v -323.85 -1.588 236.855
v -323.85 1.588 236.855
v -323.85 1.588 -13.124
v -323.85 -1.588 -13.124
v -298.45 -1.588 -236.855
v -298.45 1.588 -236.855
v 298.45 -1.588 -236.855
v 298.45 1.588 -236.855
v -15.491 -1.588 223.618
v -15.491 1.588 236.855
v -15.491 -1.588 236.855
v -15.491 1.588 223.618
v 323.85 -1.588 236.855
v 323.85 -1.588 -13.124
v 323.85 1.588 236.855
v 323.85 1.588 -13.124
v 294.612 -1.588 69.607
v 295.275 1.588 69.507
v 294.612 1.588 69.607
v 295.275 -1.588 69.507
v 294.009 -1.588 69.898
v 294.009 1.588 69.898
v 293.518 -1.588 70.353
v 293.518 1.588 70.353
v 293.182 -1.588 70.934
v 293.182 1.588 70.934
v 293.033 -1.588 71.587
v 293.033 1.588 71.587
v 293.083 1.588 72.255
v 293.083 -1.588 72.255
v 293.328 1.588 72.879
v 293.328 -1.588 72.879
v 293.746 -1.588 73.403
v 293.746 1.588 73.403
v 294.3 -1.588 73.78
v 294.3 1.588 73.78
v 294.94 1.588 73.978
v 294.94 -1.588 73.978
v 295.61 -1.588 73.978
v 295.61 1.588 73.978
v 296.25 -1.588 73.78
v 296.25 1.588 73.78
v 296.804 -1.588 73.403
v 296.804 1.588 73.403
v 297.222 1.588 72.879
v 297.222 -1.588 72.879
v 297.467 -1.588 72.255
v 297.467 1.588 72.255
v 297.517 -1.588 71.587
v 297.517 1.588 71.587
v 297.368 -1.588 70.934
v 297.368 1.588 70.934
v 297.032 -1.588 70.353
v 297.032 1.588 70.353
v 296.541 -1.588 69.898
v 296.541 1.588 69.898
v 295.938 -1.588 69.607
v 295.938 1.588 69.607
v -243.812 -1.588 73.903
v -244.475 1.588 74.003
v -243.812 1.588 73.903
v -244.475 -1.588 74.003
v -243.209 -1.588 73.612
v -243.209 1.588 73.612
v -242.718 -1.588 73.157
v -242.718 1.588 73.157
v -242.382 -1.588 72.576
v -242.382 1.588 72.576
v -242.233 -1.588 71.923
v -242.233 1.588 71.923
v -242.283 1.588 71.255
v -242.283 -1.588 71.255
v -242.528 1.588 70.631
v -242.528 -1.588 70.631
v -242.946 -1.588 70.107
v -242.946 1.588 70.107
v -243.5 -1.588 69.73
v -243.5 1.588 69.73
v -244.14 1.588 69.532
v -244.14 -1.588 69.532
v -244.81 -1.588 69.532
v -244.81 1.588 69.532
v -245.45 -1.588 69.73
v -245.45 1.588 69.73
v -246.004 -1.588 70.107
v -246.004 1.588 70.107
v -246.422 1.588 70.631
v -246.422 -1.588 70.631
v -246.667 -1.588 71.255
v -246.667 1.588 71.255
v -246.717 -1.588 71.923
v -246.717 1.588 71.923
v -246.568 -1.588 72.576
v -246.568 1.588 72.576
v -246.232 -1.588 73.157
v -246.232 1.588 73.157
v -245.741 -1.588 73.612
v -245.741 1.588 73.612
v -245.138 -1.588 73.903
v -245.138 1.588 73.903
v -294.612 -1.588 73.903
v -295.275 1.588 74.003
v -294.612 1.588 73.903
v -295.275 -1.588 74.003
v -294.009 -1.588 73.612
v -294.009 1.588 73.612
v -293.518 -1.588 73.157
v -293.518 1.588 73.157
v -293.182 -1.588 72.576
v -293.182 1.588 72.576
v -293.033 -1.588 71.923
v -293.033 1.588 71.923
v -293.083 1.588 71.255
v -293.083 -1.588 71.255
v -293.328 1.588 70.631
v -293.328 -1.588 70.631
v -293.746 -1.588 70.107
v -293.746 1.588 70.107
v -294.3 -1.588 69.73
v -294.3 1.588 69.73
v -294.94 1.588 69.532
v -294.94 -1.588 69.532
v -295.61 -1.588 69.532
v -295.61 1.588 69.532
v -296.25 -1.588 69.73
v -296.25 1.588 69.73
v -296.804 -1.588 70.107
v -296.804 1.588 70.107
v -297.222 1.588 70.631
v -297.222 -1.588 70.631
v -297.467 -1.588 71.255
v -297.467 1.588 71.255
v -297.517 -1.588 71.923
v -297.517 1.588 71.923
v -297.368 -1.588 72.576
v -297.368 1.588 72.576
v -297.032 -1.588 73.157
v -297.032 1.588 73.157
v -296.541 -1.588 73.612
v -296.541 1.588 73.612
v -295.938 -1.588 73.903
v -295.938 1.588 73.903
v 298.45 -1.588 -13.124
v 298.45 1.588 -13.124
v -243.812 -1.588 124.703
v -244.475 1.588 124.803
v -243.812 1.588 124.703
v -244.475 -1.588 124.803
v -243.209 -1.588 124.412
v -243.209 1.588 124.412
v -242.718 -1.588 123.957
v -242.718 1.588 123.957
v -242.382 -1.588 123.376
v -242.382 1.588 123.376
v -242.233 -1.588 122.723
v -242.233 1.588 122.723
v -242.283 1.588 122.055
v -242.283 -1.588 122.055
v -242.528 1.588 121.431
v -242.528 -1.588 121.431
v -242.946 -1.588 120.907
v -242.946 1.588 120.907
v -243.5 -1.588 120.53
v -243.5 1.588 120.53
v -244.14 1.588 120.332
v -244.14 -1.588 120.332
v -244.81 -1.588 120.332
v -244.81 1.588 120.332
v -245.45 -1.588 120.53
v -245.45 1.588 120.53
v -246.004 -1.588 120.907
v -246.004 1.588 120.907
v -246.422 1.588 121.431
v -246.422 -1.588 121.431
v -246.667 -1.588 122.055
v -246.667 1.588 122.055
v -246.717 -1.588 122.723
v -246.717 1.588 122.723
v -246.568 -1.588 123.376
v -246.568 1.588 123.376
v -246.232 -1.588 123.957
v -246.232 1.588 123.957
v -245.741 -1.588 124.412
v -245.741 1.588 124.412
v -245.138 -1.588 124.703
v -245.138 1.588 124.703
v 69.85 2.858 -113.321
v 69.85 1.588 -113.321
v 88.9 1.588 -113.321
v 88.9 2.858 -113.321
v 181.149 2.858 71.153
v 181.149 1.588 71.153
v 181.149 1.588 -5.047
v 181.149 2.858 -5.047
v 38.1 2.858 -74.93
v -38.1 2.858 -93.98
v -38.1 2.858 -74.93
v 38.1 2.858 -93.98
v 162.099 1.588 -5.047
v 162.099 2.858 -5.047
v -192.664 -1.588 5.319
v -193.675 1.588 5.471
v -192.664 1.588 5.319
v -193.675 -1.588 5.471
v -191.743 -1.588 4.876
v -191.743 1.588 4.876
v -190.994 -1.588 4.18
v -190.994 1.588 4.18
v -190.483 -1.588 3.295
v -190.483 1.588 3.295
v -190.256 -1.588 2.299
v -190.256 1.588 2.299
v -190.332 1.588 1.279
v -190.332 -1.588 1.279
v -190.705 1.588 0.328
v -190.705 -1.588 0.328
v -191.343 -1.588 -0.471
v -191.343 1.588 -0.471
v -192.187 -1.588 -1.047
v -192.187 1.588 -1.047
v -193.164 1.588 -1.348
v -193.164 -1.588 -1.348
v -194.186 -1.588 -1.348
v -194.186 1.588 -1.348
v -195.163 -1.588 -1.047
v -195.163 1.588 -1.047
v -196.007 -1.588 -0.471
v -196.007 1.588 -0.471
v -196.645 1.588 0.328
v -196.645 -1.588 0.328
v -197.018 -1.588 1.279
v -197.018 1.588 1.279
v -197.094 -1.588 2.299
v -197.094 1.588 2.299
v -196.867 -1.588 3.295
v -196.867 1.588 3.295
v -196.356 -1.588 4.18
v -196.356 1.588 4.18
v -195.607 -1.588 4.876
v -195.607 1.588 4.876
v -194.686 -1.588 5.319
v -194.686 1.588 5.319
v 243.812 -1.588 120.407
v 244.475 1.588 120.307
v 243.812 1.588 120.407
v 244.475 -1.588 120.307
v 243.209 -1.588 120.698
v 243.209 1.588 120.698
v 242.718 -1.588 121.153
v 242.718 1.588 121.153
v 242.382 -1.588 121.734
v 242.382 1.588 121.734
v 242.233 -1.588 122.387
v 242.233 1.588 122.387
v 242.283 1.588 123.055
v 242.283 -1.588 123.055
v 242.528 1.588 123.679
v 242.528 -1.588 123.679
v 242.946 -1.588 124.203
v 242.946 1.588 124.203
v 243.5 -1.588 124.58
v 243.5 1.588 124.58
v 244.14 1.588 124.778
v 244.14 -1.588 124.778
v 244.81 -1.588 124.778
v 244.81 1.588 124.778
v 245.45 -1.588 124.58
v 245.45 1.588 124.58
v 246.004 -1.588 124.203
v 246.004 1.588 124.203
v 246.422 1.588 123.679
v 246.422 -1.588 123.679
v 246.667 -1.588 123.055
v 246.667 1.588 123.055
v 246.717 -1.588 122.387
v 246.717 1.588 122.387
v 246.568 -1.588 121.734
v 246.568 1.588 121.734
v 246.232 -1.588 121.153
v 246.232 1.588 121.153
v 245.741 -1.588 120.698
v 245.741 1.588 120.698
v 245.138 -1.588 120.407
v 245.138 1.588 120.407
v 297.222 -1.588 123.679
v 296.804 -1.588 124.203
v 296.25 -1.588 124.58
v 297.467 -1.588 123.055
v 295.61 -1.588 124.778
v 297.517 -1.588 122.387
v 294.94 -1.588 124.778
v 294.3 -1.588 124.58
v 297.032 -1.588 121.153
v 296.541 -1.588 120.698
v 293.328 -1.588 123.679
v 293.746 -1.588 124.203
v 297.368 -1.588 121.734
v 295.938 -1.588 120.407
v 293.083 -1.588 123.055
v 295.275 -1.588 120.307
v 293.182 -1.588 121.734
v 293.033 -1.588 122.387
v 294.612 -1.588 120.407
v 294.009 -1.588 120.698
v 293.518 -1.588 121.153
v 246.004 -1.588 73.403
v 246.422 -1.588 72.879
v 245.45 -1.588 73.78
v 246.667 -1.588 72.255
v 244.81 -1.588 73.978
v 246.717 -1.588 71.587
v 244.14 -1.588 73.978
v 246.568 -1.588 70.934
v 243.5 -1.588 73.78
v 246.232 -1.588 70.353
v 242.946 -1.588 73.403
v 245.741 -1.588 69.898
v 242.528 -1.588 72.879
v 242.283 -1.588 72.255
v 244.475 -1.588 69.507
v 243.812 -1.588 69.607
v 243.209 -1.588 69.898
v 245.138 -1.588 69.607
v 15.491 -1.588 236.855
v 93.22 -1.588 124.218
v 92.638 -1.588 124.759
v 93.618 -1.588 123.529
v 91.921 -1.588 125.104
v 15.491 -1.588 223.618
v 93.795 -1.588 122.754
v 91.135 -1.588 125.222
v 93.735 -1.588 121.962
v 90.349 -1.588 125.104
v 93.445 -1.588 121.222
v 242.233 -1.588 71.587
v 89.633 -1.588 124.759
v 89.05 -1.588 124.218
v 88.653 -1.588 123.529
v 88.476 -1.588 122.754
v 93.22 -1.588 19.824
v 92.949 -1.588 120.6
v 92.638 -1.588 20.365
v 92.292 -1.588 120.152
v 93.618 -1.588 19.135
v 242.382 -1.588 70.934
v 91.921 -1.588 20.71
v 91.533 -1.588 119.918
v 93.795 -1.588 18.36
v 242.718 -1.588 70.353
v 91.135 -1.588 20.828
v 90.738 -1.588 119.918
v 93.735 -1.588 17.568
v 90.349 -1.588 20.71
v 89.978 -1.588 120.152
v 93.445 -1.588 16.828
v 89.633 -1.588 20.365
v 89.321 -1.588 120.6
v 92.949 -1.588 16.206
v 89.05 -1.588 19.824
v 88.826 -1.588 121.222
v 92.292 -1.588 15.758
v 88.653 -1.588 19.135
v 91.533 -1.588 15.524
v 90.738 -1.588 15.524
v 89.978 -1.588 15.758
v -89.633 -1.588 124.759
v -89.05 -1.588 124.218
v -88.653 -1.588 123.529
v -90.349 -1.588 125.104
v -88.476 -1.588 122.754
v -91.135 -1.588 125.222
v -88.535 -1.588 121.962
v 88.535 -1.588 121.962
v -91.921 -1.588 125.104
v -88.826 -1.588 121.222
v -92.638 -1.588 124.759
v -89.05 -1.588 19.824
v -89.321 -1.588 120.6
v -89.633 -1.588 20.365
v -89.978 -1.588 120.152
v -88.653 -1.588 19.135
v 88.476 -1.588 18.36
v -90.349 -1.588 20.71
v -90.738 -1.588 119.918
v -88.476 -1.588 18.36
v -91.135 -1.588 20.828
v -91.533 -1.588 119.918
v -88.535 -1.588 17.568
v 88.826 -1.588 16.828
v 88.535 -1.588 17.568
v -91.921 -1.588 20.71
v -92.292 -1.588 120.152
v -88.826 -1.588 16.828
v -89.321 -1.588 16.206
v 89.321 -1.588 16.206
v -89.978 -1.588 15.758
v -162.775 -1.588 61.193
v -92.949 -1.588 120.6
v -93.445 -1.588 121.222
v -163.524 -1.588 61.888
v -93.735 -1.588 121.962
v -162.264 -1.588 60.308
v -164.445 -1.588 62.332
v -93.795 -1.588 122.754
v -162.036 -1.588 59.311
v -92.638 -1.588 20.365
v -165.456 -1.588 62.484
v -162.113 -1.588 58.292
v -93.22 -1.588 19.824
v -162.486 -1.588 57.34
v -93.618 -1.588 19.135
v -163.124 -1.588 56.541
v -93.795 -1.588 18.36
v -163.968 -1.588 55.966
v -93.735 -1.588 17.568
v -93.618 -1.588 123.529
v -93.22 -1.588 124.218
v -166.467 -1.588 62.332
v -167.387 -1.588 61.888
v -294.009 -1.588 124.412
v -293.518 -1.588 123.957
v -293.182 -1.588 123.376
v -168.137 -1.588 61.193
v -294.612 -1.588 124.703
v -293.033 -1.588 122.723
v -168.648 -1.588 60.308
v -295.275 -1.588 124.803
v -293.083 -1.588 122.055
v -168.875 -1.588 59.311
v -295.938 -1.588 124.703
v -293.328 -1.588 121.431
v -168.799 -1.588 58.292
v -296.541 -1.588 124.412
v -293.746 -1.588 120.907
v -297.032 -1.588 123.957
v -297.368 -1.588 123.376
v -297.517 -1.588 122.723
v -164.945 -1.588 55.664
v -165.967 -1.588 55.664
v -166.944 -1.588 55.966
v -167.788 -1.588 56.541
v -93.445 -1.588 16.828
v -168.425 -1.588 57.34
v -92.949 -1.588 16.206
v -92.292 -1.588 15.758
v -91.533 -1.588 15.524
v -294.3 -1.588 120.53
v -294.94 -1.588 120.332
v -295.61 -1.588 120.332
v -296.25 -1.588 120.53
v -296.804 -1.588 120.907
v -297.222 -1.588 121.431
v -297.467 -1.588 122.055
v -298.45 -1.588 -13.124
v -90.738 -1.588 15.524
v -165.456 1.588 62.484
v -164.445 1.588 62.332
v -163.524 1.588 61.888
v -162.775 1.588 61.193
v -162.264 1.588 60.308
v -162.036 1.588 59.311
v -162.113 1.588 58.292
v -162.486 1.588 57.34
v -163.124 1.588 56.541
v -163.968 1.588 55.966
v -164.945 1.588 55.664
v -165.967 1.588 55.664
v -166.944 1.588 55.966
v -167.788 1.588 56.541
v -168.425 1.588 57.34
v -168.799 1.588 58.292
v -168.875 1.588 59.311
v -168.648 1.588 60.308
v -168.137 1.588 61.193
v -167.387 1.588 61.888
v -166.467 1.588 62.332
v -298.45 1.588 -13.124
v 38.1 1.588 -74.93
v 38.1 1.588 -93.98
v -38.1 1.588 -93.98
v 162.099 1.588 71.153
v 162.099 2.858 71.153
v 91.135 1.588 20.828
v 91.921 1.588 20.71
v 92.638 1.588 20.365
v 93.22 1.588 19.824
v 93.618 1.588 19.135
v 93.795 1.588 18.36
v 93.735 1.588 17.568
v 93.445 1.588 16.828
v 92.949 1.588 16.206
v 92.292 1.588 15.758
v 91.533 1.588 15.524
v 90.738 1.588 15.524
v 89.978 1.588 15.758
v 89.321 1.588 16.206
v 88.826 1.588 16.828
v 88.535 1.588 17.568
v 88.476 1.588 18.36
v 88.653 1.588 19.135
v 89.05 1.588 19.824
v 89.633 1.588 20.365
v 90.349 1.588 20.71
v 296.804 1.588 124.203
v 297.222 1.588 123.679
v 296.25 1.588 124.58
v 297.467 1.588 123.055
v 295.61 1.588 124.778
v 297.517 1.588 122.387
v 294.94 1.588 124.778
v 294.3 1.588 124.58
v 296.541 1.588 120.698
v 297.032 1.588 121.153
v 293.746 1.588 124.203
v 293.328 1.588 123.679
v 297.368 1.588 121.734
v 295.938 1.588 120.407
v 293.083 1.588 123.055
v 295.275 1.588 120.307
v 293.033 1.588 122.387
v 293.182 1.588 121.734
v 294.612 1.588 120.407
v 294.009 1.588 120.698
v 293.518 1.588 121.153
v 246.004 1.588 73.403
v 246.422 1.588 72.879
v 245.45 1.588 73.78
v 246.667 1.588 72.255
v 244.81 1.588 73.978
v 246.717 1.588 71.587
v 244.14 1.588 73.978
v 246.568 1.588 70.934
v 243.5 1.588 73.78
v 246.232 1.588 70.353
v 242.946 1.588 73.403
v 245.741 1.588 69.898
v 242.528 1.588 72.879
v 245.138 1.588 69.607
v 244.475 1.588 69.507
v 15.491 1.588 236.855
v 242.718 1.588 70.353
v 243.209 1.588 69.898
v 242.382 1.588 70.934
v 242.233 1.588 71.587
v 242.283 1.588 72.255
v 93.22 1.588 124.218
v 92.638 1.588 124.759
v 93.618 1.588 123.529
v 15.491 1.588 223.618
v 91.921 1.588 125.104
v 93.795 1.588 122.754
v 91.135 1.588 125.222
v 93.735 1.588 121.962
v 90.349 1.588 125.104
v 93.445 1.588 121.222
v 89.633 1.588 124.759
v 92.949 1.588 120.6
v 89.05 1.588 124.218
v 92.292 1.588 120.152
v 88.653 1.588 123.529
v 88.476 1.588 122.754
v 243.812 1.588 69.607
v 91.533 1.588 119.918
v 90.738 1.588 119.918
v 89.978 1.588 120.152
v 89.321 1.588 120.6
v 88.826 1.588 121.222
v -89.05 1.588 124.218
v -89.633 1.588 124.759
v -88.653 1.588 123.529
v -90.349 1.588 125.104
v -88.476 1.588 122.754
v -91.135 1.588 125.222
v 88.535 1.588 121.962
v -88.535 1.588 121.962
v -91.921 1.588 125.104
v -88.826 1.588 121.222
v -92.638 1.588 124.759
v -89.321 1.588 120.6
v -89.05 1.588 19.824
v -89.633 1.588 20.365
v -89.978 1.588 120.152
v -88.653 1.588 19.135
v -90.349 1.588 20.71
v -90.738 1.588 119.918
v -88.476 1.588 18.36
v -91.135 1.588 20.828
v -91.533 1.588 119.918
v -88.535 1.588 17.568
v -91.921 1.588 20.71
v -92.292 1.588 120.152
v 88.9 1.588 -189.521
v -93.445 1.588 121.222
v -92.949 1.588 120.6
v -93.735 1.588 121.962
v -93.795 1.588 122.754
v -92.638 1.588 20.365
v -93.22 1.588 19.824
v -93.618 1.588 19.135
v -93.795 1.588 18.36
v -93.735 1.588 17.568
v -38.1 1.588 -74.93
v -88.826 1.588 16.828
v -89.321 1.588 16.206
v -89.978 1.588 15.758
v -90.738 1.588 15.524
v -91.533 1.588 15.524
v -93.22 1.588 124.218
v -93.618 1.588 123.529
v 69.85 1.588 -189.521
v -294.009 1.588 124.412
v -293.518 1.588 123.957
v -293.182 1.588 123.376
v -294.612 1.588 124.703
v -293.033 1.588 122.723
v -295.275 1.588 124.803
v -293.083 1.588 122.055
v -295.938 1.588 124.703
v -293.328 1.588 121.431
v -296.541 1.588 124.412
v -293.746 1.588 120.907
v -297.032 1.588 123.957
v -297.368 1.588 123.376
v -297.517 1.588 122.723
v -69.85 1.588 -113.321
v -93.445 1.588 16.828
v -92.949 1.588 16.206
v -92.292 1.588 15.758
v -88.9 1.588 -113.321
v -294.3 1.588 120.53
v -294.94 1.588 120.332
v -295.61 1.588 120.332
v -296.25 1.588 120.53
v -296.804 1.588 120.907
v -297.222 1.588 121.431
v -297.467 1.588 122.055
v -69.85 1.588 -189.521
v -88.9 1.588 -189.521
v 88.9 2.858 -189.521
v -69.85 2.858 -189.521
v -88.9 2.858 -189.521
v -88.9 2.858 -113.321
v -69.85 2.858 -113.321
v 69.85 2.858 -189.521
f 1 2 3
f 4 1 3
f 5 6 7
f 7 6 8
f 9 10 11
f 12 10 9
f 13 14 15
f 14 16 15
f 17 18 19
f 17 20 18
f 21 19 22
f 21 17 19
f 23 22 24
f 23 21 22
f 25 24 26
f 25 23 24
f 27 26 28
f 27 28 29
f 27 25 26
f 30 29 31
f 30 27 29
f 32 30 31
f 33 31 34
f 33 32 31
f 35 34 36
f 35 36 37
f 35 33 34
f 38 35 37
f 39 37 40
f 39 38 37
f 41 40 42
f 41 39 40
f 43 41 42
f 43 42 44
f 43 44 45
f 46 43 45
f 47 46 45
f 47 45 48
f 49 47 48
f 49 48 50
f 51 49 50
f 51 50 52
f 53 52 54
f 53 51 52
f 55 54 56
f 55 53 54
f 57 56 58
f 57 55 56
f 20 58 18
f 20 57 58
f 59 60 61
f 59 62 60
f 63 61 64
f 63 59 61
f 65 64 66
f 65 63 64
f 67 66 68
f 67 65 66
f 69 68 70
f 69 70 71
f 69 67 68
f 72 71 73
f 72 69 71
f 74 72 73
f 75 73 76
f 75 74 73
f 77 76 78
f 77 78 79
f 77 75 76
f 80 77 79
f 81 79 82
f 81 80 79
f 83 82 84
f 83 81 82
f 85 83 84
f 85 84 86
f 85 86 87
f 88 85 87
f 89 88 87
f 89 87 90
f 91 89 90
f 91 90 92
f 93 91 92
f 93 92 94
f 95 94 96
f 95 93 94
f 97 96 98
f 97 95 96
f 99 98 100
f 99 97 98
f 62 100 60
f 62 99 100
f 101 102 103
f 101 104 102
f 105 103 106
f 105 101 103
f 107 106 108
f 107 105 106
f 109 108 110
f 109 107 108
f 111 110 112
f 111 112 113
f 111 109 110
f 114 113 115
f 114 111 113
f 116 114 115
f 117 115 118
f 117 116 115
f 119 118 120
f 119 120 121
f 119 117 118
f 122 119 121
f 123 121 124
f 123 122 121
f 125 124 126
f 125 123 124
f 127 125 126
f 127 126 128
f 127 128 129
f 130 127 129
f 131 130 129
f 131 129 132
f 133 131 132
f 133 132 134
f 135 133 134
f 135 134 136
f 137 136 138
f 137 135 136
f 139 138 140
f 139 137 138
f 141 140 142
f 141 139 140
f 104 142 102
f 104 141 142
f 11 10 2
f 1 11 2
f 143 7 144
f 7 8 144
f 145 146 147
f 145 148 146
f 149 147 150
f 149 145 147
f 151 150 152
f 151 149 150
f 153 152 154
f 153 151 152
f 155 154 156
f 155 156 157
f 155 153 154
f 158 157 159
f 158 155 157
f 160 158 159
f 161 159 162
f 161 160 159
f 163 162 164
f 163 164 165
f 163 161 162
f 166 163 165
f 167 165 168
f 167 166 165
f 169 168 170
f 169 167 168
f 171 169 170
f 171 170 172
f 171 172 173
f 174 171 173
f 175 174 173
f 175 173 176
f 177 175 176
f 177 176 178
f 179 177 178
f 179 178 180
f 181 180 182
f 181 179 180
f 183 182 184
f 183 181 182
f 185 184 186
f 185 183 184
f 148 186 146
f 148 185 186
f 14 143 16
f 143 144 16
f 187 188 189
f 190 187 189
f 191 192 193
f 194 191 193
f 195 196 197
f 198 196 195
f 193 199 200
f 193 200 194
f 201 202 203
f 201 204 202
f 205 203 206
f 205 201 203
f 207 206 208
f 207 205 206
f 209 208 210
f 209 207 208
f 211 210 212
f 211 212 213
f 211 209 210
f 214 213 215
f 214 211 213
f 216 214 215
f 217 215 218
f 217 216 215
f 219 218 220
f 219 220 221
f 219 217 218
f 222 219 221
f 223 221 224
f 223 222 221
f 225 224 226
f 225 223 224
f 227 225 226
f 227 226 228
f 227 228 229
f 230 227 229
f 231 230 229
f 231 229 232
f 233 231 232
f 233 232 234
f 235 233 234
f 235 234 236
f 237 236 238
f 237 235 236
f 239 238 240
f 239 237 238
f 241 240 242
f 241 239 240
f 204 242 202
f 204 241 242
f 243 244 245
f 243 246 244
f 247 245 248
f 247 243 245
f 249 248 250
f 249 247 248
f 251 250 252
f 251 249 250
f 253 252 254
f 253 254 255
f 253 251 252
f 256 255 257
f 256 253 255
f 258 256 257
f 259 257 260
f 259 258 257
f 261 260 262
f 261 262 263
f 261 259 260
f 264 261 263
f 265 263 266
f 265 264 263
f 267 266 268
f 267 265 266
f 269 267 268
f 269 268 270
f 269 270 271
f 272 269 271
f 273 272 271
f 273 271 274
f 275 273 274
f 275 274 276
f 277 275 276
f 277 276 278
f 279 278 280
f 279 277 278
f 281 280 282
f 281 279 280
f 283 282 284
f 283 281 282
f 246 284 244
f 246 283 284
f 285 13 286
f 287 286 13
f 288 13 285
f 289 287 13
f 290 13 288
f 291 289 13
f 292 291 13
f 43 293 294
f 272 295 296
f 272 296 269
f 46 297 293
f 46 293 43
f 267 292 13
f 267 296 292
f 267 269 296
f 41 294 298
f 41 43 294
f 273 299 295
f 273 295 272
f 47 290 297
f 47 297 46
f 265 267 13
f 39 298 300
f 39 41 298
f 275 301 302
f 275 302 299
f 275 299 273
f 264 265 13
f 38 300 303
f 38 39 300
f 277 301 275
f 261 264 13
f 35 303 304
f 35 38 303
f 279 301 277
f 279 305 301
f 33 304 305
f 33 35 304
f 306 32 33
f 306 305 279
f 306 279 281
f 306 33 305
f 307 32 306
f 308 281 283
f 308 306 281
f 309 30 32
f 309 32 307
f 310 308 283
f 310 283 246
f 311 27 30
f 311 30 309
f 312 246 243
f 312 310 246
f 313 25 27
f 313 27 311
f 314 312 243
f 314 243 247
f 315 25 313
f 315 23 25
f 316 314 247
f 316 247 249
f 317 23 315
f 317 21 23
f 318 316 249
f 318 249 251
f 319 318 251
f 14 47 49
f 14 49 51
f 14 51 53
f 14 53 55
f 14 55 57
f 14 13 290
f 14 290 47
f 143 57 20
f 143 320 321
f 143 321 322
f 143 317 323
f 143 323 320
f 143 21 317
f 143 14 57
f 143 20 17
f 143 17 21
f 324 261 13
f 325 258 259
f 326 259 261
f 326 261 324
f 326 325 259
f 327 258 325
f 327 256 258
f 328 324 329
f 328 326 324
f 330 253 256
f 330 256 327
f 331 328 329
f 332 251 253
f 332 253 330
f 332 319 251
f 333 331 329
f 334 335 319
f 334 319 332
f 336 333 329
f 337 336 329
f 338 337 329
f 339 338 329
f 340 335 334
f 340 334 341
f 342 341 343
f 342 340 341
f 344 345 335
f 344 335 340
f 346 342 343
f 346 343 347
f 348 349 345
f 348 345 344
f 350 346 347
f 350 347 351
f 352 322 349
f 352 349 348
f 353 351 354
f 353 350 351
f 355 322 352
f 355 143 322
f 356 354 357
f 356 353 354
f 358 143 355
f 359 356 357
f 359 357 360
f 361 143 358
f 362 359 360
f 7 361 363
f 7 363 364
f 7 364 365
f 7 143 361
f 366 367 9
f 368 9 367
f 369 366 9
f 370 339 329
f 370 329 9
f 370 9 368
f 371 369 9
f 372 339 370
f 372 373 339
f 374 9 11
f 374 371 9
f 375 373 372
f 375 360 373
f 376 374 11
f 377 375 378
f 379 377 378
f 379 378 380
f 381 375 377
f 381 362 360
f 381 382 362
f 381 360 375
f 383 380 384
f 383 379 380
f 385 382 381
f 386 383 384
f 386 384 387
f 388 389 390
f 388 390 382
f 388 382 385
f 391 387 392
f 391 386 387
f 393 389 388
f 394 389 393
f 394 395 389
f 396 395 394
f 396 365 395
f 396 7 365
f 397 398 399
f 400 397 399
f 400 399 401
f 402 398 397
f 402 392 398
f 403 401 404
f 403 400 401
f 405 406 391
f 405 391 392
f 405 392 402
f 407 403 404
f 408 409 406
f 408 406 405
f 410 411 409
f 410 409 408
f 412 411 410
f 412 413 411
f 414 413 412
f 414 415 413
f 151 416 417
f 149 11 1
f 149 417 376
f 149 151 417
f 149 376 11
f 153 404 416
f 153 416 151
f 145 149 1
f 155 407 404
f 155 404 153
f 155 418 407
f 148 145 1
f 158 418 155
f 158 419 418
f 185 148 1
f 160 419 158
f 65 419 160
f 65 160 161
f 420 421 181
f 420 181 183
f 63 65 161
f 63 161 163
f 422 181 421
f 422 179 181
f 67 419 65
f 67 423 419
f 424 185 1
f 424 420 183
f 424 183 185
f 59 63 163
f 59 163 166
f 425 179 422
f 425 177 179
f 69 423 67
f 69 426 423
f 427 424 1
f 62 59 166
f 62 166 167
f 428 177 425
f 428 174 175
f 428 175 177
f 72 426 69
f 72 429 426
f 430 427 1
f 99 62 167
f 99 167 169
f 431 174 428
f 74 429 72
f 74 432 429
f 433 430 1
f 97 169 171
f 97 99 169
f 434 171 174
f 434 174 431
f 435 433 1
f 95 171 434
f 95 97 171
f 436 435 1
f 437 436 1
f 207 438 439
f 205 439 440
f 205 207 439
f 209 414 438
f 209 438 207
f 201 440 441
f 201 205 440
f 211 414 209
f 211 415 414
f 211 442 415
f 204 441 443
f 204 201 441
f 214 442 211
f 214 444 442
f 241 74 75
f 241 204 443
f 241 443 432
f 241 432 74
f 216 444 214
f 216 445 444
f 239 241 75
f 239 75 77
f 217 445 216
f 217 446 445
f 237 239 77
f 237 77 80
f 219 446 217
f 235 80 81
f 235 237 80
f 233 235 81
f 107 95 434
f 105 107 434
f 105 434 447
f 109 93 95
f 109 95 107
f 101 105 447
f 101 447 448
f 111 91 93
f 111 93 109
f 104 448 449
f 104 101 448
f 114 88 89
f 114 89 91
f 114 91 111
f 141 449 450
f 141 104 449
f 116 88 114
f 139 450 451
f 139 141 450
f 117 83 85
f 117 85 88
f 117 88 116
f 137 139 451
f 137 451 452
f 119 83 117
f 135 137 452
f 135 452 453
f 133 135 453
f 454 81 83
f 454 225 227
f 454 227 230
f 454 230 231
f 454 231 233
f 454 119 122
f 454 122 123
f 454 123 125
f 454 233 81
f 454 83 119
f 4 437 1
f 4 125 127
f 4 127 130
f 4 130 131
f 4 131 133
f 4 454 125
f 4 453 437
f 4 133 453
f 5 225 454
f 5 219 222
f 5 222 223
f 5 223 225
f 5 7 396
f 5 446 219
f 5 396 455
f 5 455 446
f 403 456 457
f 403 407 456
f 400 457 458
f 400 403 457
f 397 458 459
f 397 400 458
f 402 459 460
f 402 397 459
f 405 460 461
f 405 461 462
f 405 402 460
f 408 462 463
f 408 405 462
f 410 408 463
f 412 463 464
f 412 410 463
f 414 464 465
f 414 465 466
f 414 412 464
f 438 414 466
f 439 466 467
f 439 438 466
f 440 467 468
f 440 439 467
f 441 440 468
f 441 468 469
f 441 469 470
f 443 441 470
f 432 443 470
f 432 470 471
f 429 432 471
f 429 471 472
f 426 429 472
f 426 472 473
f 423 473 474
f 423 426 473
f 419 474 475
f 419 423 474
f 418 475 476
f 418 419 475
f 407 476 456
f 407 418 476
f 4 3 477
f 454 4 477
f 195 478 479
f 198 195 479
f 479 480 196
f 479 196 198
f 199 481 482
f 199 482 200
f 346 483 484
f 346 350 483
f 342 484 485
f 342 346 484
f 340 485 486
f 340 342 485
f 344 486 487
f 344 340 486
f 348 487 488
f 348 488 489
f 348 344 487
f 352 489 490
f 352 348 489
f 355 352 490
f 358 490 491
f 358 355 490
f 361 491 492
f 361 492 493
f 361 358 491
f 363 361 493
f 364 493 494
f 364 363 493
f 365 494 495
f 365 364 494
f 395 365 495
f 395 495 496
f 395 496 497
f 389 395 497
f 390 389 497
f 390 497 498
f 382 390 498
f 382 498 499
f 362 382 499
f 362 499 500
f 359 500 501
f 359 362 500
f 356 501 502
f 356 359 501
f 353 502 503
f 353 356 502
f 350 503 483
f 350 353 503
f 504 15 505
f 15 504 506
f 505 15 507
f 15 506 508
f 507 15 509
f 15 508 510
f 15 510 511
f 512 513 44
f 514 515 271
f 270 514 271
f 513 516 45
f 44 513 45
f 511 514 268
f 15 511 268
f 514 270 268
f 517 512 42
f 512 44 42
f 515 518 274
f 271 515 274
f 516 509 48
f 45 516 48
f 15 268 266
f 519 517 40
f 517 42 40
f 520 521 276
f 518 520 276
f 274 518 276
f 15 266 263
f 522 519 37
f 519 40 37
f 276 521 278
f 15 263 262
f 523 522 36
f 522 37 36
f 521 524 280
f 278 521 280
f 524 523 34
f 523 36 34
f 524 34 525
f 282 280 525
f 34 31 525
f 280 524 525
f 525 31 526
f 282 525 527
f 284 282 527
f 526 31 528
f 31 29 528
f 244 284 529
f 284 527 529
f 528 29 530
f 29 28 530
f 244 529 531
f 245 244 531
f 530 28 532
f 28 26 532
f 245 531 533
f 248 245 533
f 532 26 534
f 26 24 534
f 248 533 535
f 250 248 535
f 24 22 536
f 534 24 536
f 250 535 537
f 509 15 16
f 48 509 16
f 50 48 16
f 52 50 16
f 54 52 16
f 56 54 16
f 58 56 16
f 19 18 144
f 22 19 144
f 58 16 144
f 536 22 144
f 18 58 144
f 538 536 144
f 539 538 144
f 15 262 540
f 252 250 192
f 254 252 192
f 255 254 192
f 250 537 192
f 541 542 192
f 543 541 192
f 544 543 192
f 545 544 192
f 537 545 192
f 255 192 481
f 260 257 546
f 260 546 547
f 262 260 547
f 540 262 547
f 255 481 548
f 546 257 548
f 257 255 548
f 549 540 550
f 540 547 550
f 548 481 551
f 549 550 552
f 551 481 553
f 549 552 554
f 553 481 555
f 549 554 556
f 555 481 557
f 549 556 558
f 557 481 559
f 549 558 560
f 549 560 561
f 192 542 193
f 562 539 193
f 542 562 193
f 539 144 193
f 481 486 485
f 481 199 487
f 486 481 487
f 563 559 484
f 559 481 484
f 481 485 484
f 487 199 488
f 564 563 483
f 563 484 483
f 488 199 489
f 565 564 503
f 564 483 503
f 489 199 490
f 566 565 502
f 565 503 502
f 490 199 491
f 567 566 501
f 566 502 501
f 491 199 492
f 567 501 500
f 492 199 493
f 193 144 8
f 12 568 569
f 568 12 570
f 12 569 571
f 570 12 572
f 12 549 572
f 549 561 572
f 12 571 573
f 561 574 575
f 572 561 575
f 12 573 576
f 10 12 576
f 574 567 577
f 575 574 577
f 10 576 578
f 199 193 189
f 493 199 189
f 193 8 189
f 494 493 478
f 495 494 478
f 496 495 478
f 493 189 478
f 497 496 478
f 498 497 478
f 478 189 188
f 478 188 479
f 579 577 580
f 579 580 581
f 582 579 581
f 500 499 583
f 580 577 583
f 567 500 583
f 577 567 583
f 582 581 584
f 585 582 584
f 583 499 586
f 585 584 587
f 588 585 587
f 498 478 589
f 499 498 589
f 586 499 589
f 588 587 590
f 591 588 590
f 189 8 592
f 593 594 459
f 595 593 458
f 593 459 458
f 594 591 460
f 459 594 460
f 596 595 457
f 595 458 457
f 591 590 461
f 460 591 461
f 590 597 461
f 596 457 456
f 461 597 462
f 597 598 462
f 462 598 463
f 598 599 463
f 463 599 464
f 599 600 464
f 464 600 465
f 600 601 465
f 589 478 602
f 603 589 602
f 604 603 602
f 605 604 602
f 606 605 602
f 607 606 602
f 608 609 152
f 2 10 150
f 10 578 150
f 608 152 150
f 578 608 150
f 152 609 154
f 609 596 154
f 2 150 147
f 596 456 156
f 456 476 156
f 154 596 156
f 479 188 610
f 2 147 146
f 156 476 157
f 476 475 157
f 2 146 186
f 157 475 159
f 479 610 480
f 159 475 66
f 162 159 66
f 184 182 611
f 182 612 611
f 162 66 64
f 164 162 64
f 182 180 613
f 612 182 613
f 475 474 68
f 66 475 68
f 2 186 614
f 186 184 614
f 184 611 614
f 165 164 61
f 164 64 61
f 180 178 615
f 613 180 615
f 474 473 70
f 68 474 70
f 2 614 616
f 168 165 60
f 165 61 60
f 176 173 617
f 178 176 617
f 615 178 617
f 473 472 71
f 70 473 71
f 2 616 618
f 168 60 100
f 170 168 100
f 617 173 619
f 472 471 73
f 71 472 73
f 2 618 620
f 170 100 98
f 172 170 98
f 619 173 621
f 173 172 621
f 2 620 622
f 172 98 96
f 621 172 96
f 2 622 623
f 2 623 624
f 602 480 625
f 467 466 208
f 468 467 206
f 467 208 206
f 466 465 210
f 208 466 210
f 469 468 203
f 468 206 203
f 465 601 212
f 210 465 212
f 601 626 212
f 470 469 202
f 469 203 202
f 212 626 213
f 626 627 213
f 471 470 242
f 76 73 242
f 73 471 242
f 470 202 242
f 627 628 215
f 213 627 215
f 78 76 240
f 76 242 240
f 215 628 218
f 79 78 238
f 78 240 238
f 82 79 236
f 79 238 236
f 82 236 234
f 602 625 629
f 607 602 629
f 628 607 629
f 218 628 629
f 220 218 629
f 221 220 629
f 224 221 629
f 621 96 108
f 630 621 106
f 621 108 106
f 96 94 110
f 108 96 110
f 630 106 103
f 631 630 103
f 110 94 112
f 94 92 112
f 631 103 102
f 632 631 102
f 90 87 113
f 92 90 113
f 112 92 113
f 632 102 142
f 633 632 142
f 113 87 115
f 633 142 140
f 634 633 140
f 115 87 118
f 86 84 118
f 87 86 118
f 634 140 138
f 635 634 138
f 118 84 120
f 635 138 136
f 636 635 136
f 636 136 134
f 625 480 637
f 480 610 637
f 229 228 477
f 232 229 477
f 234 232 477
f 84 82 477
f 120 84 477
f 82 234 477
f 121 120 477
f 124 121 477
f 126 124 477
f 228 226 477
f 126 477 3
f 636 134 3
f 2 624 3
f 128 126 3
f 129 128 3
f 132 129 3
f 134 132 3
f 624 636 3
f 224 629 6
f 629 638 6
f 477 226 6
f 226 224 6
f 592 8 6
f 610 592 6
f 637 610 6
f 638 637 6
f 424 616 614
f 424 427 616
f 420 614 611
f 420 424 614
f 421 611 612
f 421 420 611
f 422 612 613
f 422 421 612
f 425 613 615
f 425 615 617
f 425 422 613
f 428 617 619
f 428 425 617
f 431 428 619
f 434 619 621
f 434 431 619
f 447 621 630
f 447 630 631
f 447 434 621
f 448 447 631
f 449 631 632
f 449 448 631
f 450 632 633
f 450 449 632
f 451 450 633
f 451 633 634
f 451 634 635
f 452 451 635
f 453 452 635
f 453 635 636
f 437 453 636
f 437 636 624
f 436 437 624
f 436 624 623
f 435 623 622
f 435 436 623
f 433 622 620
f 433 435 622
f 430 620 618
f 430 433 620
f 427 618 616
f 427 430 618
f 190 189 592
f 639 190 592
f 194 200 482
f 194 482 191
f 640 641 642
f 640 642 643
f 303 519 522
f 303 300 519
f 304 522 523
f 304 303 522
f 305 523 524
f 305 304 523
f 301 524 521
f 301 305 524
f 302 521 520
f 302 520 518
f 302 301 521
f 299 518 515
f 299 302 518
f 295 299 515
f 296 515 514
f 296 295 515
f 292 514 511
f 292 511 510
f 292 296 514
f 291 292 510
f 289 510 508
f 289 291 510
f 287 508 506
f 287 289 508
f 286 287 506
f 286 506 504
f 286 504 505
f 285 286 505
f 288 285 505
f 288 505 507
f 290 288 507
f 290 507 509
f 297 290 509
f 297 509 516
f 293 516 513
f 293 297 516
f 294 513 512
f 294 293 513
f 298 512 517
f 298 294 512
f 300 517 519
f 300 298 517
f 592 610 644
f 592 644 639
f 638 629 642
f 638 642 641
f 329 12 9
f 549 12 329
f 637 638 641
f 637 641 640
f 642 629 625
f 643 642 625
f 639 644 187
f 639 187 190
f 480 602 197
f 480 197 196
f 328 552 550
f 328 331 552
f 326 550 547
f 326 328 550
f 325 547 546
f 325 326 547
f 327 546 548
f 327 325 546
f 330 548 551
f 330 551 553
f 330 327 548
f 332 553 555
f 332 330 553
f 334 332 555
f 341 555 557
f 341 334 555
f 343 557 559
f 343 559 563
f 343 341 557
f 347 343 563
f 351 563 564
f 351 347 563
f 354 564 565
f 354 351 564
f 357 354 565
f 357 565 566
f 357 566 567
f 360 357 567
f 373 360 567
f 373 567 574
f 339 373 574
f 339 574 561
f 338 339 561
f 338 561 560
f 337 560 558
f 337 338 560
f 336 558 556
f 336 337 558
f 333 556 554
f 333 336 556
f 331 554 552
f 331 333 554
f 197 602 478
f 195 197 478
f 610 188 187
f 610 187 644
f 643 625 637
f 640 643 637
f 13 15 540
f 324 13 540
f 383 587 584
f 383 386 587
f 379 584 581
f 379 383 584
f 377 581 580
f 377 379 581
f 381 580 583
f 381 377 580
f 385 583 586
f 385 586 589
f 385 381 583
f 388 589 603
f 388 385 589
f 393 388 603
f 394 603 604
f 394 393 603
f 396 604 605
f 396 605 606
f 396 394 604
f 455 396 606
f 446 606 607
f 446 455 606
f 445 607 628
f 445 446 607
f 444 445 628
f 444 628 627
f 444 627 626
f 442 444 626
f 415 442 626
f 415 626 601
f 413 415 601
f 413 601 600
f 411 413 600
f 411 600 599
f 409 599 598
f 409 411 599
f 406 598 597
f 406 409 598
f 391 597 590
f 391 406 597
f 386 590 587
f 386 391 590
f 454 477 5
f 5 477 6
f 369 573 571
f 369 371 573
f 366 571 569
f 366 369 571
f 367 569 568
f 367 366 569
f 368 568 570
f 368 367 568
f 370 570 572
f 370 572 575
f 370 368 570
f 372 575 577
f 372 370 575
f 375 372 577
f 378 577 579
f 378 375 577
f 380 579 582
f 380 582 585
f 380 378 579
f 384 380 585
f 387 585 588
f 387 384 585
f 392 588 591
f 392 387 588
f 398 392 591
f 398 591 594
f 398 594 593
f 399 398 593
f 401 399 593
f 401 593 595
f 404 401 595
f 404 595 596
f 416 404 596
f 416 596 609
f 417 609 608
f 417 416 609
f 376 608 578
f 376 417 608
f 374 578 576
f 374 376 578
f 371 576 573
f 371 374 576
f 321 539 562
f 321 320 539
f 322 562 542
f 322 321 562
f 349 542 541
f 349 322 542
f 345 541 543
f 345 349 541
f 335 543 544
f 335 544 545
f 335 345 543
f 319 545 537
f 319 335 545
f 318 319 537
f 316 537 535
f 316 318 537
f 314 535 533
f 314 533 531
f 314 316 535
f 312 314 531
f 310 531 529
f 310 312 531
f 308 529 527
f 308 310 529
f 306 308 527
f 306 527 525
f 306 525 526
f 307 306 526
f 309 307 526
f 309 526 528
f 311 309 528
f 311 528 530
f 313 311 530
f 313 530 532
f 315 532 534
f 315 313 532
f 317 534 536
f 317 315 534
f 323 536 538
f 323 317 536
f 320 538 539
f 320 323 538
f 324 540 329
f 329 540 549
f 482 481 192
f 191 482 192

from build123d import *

# Parameters (mm, degrees)
SKETCH1_R           = 2.667
SKETCH1_R_2         = 2.2479
SKETCH1_R_3         = 3.429
BOSS_EXTRUDE1_DEPTH = 1.5875
SKETCH4_W           = 30.98284419
SKETCH4_H           = 26.473645648
CUT_EXTRUDE2_DEPTH  = 402.23458743
SKETCH5_W           = 76.2
SKETCH5_H           = 19.05
SKETCH5_W_2         = 19.05
SKETCH5_H_2         = 76.2
BOSS_EXTRUDE2_DEPTH = 1.27


with BuildPart() as part:
    # Sketch1 → Boss-Extrude1 (new, symmetric)
    with BuildSketch(Plane(origin=(0, 0, 0), x_dir=(1, 0, 0), z_dir=(0, 1, 0))):
        Polygon((-298.45, 13.124176698), (-298.45, 236.855), (298.45, 236.855), (298.45, 13.124176698), (323.85, 13.124176698), (323.85, -236.855), (-323.85, -236.855), (-323.85, 13.124176698), align=None)
        with Locations(Location((91.135199987, -18.161, 0), (0, 0, 270))):
            Circle(SKETCH1_R, mode=Mode.SUBTRACT)
        with Locations(Location((91.135199987, -122.555, 0), (0, 0, 270))):
            Circle(SKETCH1_R, mode=Mode.SUBTRACT)
        with Locations(Location((-91.135199987, -122.555, 0), (0, 0, 270))):
            Circle(SKETCH1_R, mode=Mode.SUBTRACT)
        with Locations(Location((-91.135199987, -18.161, 0), (0, 0, 270))):
            Circle(SKETCH1_R, mode=Mode.SUBTRACT)
        with Locations(Location((-295.275, -71.755, 0), (0, 0, 270))):
            Circle(SKETCH1_R_2, mode=Mode.SUBTRACT)
        with Locations(Location((-244.475, -71.755, 0), (0, 0, 270))):
            Circle(SKETCH1_R_2, mode=Mode.SUBTRACT)
        with Locations(Location((-244.475, -122.555, 0), (0, 0, 270))):
            Circle(SKETCH1_R_2, mode=Mode.SUBTRACT)
        with Locations(Location((-295.275, -122.555, 0), (0, 0, 270))):
            Circle(SKETCH1_R_2, mode=Mode.SUBTRACT)
        with Locations(Location((295.275, -122.555, 0), (0, 0, 90))):
            Circle(SKETCH1_R_2, mode=Mode.SUBTRACT)
        with Locations(Location((244.475, -122.555, 0), (0, 0, 90))):
            Circle(SKETCH1_R_2, mode=Mode.SUBTRACT)
        with Locations(Location((244.475, -71.755, 0), (0, 0, 90))):
            Circle(SKETCH1_R_2, mode=Mode.SUBTRACT)
        with Locations(Location((295.275, -71.755, 0), (0, 0, 90))):
            Circle(SKETCH1_R_2, mode=Mode.SUBTRACT)
        with Locations(Location((-193.675, -2.042328148, 0), (0, 0, 270))):
            Circle(SKETCH1_R_3, mode=Mode.SUBTRACT)
        with Locations(Location((-165.455833426, -59.055, 0), (0, 0, 270))):
            Circle(SKETCH1_R_3, mode=Mode.SUBTRACT)
    extrude(amount=BOSS_EXTRUDE1_DEPTH, both=True)

    # Sketch4 → Cut-Extrude2 (cut, through all)
    with BuildSketch(Plane(origin=(0, 1.5875, 0), x_dir=(1, 0, 0), z_dir=(0, 1, 0))):
        with Locations((0, -236.855)):
            Rectangle(SKETCH4_W, SKETCH4_H)
    extrude(amount=-CUT_EXTRUDE2_DEPTH, mode=Mode.SUBTRACT)

    # Sketch5 → Boss-Extrude2 (add)
    with BuildSketch(Plane(origin=(0, 1.5875, 0), x_dir=(1, 0, 0), z_dir=(0, 1, 0))):
        with Locations((0, 84.455)):
            Rectangle(SKETCH5_W, SKETCH5_H)
        with Locations((-79.375, 151.421322831)):
            Rectangle(SKETCH5_W_2, SKETCH5_H_2)
        with Locations((79.375, 151.421322831)):
            Rectangle(SKETCH5_W_2, SKETCH5_H_2)
        with Locations((171.623795352, -33.052997334)):
            Rectangle(SKETCH5_W_2, SKETCH5_H_2)
    extrude(amount=BOSS_EXTRUDE2_DEPTH)


solid = part.part
